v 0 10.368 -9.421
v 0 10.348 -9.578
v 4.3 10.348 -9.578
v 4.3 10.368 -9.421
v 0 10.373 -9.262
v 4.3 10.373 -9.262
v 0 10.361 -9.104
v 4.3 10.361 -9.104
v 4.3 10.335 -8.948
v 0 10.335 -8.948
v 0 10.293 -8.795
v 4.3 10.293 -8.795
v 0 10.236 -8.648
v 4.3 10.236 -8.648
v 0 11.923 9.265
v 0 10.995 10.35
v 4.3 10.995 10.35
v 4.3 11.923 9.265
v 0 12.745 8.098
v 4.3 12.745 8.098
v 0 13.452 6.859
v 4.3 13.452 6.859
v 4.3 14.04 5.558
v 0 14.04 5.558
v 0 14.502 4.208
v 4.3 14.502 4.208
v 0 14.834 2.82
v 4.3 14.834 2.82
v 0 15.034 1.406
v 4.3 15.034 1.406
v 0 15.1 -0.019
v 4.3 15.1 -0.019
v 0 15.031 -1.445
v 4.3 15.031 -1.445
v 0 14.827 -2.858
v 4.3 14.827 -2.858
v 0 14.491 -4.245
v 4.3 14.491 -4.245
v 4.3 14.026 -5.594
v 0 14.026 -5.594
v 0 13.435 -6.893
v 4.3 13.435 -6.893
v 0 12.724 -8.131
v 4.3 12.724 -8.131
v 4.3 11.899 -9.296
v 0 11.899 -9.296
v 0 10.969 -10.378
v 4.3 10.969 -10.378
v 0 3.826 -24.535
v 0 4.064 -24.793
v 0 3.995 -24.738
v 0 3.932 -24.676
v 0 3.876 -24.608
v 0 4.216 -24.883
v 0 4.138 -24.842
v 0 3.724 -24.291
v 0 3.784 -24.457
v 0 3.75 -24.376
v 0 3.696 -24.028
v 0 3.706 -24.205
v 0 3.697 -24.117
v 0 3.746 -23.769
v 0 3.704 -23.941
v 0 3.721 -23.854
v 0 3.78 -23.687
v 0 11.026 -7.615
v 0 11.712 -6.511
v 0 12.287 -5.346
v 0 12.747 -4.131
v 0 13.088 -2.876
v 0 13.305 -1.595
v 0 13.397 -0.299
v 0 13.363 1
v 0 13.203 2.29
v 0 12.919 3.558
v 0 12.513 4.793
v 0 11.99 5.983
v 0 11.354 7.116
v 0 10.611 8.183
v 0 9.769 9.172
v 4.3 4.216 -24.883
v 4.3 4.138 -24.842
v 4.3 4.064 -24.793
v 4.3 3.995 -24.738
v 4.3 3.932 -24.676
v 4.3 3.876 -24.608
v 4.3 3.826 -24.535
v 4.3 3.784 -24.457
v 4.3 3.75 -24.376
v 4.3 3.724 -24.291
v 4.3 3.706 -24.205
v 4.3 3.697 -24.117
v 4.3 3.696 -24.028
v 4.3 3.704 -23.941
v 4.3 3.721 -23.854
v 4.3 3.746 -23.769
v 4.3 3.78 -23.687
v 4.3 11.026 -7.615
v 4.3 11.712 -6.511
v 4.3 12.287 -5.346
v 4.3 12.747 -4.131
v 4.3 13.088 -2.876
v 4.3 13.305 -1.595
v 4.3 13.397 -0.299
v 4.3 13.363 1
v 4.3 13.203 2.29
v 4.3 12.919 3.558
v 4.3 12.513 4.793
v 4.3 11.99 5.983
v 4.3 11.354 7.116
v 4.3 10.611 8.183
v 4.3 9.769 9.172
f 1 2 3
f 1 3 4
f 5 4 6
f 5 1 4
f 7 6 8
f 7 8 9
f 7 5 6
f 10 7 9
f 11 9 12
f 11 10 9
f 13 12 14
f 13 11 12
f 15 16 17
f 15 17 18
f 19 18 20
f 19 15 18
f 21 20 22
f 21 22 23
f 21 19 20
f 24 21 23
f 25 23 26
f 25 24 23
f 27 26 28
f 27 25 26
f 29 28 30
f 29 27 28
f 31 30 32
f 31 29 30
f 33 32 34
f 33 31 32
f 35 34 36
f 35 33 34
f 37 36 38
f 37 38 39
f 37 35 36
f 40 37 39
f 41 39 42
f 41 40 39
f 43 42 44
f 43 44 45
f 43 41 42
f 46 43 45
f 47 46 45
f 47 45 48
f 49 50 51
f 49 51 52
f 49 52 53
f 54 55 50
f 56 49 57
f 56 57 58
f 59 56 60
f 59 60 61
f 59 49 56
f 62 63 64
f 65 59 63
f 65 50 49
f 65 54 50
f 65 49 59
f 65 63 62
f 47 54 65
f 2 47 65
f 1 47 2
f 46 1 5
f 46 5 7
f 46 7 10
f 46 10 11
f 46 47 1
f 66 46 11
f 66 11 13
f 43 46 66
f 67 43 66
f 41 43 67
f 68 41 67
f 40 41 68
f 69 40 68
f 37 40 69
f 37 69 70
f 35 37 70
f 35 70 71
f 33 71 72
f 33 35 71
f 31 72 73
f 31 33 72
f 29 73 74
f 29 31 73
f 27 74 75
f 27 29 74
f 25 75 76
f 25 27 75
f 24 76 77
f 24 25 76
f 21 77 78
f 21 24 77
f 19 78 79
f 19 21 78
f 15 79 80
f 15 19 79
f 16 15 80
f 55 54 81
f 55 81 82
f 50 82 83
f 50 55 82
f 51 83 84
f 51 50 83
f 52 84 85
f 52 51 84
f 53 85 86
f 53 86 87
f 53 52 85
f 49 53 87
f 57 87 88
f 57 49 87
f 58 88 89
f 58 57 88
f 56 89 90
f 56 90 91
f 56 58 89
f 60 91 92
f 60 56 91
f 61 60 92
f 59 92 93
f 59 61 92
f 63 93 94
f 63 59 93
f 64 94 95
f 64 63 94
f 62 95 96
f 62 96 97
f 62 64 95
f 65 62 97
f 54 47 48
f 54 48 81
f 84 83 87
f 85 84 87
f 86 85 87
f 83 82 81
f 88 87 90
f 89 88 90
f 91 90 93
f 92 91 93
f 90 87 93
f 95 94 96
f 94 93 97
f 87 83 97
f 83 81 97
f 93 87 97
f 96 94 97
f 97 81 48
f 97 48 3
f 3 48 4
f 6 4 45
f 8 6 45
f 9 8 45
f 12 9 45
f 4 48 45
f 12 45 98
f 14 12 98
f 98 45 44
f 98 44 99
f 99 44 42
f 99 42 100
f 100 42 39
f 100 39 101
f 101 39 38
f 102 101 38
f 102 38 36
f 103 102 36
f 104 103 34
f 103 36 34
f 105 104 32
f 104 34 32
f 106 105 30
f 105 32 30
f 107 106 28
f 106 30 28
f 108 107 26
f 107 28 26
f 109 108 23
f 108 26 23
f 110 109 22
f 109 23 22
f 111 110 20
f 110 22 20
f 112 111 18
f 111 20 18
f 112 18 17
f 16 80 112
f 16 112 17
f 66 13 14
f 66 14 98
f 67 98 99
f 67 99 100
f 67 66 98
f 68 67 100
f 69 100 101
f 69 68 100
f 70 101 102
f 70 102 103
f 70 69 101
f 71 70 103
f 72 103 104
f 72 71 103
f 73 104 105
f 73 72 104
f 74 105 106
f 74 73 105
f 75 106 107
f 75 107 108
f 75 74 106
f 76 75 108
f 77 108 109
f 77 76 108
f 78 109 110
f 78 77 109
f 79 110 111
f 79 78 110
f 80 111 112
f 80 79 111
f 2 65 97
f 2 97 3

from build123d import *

# Parameters (mm, degrees)
BOSS_EXTRUDE1_DEPTH = 4.3


with BuildPart() as part:
    # Sketch1 → Boss-Extrude1 (new body)
    with BuildSketch(Plane(origin=(0, 0, 0), x_dir=(0, 0, -1), z_dir=(1, 0, 0))):
        with BuildLine():
            Line((10.377941535, 10.968515373), (24.883087867, 4.215684123))
            ThreePointArc((24.883087867, 4.215684123), (24.37551983, 3.75), (23.687326628, 3.7796164))
            Line((23.687326628, 3.7796164), (9.577602267, 10.348360032))
            ThreePointArc((9.577602267, 10.348360032), (9.104252866, 10.361422213), (8.647588121, 10.236172121))
            ThreePointArc((8.647588121, 10.236172121), (-0.351285356, 13.395394679), (-9.172206838, 9.768859797))
            Line((-9.172206838, 9.768859797), (-10.349710711, 10.995157488))
            ThreePointArc((-10.349710711, 10.995157488), (0.019408643, 15.099987527), (10.377941535, 10.968515373))
        make_face()
    extrude(amount=BOSS_EXTRUDE1_DEPTH)


solid = part.part
